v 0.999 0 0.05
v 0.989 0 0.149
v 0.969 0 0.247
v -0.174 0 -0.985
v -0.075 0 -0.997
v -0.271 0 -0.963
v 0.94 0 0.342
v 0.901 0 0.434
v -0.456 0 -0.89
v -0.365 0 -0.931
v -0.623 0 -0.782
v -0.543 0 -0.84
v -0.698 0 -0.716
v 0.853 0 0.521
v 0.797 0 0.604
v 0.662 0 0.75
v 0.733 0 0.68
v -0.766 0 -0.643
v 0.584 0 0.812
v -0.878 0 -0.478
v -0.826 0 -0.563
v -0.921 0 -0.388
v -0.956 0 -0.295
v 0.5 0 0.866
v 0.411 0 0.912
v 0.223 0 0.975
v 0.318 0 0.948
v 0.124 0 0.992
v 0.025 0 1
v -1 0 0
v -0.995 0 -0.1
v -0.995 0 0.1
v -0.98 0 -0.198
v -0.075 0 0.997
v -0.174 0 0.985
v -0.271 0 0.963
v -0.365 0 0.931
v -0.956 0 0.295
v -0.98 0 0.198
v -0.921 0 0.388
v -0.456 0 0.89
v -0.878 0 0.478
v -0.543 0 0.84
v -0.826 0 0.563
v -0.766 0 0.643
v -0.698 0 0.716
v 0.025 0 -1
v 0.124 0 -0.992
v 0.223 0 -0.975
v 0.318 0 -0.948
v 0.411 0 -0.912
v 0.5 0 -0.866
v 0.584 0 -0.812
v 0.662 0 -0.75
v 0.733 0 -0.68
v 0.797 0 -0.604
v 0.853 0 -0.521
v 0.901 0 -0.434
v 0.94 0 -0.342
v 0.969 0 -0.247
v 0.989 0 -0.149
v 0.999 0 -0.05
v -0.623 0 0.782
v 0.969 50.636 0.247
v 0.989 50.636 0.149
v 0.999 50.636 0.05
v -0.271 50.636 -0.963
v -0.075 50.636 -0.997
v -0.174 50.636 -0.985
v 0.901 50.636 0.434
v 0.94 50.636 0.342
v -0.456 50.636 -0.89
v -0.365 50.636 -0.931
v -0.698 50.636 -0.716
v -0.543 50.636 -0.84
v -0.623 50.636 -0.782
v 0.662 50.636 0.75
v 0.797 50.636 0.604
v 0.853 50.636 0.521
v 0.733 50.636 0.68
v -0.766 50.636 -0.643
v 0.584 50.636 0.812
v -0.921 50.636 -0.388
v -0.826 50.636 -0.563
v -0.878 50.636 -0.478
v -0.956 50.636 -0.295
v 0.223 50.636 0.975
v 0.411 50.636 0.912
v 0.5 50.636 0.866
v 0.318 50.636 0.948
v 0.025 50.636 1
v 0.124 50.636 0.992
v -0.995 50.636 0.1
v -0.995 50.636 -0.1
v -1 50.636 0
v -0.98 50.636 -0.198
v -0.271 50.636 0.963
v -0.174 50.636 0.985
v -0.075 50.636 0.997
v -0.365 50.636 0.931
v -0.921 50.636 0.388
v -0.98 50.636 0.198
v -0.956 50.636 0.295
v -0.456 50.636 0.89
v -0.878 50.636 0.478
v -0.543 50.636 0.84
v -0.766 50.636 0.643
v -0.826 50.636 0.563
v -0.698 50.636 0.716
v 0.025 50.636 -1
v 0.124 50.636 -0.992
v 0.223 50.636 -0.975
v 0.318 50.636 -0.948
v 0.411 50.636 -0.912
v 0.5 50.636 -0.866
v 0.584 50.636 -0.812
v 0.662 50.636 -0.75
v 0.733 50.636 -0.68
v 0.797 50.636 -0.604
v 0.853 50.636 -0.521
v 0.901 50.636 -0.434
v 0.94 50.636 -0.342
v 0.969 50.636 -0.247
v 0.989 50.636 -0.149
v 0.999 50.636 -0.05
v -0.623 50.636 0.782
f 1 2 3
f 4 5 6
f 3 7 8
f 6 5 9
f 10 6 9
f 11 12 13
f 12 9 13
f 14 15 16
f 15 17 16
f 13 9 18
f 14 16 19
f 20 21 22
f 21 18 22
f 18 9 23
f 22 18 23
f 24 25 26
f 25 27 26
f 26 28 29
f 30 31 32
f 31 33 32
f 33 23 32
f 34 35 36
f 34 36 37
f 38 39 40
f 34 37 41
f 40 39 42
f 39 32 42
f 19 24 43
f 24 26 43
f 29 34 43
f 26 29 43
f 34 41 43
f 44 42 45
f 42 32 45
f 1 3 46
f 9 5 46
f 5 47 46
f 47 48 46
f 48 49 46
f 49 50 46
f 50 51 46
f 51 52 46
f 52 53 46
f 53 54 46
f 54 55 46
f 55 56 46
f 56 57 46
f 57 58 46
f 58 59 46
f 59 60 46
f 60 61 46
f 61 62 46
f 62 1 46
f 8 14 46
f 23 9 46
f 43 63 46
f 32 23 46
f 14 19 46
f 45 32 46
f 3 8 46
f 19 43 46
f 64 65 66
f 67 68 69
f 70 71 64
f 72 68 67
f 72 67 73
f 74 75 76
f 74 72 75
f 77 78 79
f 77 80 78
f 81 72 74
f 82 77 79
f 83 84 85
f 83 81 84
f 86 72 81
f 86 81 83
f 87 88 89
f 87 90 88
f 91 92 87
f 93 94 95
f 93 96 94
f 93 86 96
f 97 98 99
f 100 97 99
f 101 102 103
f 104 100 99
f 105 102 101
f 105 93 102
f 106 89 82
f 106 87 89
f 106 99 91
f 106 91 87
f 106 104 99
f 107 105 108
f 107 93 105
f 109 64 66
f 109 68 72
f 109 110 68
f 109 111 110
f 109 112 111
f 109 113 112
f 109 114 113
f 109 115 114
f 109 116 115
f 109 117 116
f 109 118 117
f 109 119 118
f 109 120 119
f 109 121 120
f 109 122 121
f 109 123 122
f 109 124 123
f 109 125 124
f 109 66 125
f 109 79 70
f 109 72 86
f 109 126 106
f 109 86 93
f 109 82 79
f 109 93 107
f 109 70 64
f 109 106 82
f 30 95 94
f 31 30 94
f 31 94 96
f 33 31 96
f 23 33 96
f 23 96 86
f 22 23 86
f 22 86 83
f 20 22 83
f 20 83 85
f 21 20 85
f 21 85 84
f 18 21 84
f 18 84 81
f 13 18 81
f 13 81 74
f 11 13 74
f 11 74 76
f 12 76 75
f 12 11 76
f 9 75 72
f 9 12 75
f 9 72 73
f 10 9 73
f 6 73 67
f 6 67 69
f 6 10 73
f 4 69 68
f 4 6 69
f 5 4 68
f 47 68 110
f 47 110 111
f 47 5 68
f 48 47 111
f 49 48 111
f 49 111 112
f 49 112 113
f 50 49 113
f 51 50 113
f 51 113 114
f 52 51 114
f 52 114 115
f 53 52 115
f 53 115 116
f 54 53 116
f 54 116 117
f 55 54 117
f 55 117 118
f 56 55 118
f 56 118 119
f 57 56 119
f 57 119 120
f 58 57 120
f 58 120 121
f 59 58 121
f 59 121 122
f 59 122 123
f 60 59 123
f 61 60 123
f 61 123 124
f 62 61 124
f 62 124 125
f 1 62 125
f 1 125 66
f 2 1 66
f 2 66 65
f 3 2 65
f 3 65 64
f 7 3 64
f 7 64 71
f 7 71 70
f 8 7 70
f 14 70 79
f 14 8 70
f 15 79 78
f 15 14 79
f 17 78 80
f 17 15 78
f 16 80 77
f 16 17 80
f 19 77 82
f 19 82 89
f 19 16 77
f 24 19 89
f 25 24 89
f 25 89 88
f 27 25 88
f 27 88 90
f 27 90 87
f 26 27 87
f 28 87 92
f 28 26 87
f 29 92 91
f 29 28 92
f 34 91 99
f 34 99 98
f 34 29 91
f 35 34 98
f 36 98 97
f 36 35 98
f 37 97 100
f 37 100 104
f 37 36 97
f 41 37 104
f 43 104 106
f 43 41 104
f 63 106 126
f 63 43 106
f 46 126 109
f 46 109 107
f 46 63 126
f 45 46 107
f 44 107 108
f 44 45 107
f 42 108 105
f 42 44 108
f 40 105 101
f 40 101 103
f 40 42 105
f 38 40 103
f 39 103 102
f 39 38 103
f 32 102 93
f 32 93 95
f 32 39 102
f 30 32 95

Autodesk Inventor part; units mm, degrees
ref_plane "YZ Plane" through (0, 0, 0) normal (1, 0, 0) x (0, 1, 0)
ref_plane "XZ Plane" through (0, 0, 0) normal (0, 1, 0) x (-1, 0, 0)
ref_plane "XY Plane" through (0, 0, 0) normal (0, 0, 1) x (1, 0, 0)
sketch "Sketch1" plane through (0, 0, 0) normal (0, 1, 0) x (-1, 0, 0)
  circle A0 centre (0, 0) radius 1
  dimension "d0" = 2
extrude "Extrusion1" add sketch "Sketch1" along normal blind 55
move faces "Move1" translate (0, -2.5, 0) faces at (-0.5848, 55, -0.397)
move faces "Move2" translate (0, -0.002, 0) faces at (-0.2495, 52.5, 0.221)
move faces "Move3" translate (0, -1.862, 0) faces at (-0.2495, 52.498, 0.221)
properties part number "LOOP2_COLL_L"
